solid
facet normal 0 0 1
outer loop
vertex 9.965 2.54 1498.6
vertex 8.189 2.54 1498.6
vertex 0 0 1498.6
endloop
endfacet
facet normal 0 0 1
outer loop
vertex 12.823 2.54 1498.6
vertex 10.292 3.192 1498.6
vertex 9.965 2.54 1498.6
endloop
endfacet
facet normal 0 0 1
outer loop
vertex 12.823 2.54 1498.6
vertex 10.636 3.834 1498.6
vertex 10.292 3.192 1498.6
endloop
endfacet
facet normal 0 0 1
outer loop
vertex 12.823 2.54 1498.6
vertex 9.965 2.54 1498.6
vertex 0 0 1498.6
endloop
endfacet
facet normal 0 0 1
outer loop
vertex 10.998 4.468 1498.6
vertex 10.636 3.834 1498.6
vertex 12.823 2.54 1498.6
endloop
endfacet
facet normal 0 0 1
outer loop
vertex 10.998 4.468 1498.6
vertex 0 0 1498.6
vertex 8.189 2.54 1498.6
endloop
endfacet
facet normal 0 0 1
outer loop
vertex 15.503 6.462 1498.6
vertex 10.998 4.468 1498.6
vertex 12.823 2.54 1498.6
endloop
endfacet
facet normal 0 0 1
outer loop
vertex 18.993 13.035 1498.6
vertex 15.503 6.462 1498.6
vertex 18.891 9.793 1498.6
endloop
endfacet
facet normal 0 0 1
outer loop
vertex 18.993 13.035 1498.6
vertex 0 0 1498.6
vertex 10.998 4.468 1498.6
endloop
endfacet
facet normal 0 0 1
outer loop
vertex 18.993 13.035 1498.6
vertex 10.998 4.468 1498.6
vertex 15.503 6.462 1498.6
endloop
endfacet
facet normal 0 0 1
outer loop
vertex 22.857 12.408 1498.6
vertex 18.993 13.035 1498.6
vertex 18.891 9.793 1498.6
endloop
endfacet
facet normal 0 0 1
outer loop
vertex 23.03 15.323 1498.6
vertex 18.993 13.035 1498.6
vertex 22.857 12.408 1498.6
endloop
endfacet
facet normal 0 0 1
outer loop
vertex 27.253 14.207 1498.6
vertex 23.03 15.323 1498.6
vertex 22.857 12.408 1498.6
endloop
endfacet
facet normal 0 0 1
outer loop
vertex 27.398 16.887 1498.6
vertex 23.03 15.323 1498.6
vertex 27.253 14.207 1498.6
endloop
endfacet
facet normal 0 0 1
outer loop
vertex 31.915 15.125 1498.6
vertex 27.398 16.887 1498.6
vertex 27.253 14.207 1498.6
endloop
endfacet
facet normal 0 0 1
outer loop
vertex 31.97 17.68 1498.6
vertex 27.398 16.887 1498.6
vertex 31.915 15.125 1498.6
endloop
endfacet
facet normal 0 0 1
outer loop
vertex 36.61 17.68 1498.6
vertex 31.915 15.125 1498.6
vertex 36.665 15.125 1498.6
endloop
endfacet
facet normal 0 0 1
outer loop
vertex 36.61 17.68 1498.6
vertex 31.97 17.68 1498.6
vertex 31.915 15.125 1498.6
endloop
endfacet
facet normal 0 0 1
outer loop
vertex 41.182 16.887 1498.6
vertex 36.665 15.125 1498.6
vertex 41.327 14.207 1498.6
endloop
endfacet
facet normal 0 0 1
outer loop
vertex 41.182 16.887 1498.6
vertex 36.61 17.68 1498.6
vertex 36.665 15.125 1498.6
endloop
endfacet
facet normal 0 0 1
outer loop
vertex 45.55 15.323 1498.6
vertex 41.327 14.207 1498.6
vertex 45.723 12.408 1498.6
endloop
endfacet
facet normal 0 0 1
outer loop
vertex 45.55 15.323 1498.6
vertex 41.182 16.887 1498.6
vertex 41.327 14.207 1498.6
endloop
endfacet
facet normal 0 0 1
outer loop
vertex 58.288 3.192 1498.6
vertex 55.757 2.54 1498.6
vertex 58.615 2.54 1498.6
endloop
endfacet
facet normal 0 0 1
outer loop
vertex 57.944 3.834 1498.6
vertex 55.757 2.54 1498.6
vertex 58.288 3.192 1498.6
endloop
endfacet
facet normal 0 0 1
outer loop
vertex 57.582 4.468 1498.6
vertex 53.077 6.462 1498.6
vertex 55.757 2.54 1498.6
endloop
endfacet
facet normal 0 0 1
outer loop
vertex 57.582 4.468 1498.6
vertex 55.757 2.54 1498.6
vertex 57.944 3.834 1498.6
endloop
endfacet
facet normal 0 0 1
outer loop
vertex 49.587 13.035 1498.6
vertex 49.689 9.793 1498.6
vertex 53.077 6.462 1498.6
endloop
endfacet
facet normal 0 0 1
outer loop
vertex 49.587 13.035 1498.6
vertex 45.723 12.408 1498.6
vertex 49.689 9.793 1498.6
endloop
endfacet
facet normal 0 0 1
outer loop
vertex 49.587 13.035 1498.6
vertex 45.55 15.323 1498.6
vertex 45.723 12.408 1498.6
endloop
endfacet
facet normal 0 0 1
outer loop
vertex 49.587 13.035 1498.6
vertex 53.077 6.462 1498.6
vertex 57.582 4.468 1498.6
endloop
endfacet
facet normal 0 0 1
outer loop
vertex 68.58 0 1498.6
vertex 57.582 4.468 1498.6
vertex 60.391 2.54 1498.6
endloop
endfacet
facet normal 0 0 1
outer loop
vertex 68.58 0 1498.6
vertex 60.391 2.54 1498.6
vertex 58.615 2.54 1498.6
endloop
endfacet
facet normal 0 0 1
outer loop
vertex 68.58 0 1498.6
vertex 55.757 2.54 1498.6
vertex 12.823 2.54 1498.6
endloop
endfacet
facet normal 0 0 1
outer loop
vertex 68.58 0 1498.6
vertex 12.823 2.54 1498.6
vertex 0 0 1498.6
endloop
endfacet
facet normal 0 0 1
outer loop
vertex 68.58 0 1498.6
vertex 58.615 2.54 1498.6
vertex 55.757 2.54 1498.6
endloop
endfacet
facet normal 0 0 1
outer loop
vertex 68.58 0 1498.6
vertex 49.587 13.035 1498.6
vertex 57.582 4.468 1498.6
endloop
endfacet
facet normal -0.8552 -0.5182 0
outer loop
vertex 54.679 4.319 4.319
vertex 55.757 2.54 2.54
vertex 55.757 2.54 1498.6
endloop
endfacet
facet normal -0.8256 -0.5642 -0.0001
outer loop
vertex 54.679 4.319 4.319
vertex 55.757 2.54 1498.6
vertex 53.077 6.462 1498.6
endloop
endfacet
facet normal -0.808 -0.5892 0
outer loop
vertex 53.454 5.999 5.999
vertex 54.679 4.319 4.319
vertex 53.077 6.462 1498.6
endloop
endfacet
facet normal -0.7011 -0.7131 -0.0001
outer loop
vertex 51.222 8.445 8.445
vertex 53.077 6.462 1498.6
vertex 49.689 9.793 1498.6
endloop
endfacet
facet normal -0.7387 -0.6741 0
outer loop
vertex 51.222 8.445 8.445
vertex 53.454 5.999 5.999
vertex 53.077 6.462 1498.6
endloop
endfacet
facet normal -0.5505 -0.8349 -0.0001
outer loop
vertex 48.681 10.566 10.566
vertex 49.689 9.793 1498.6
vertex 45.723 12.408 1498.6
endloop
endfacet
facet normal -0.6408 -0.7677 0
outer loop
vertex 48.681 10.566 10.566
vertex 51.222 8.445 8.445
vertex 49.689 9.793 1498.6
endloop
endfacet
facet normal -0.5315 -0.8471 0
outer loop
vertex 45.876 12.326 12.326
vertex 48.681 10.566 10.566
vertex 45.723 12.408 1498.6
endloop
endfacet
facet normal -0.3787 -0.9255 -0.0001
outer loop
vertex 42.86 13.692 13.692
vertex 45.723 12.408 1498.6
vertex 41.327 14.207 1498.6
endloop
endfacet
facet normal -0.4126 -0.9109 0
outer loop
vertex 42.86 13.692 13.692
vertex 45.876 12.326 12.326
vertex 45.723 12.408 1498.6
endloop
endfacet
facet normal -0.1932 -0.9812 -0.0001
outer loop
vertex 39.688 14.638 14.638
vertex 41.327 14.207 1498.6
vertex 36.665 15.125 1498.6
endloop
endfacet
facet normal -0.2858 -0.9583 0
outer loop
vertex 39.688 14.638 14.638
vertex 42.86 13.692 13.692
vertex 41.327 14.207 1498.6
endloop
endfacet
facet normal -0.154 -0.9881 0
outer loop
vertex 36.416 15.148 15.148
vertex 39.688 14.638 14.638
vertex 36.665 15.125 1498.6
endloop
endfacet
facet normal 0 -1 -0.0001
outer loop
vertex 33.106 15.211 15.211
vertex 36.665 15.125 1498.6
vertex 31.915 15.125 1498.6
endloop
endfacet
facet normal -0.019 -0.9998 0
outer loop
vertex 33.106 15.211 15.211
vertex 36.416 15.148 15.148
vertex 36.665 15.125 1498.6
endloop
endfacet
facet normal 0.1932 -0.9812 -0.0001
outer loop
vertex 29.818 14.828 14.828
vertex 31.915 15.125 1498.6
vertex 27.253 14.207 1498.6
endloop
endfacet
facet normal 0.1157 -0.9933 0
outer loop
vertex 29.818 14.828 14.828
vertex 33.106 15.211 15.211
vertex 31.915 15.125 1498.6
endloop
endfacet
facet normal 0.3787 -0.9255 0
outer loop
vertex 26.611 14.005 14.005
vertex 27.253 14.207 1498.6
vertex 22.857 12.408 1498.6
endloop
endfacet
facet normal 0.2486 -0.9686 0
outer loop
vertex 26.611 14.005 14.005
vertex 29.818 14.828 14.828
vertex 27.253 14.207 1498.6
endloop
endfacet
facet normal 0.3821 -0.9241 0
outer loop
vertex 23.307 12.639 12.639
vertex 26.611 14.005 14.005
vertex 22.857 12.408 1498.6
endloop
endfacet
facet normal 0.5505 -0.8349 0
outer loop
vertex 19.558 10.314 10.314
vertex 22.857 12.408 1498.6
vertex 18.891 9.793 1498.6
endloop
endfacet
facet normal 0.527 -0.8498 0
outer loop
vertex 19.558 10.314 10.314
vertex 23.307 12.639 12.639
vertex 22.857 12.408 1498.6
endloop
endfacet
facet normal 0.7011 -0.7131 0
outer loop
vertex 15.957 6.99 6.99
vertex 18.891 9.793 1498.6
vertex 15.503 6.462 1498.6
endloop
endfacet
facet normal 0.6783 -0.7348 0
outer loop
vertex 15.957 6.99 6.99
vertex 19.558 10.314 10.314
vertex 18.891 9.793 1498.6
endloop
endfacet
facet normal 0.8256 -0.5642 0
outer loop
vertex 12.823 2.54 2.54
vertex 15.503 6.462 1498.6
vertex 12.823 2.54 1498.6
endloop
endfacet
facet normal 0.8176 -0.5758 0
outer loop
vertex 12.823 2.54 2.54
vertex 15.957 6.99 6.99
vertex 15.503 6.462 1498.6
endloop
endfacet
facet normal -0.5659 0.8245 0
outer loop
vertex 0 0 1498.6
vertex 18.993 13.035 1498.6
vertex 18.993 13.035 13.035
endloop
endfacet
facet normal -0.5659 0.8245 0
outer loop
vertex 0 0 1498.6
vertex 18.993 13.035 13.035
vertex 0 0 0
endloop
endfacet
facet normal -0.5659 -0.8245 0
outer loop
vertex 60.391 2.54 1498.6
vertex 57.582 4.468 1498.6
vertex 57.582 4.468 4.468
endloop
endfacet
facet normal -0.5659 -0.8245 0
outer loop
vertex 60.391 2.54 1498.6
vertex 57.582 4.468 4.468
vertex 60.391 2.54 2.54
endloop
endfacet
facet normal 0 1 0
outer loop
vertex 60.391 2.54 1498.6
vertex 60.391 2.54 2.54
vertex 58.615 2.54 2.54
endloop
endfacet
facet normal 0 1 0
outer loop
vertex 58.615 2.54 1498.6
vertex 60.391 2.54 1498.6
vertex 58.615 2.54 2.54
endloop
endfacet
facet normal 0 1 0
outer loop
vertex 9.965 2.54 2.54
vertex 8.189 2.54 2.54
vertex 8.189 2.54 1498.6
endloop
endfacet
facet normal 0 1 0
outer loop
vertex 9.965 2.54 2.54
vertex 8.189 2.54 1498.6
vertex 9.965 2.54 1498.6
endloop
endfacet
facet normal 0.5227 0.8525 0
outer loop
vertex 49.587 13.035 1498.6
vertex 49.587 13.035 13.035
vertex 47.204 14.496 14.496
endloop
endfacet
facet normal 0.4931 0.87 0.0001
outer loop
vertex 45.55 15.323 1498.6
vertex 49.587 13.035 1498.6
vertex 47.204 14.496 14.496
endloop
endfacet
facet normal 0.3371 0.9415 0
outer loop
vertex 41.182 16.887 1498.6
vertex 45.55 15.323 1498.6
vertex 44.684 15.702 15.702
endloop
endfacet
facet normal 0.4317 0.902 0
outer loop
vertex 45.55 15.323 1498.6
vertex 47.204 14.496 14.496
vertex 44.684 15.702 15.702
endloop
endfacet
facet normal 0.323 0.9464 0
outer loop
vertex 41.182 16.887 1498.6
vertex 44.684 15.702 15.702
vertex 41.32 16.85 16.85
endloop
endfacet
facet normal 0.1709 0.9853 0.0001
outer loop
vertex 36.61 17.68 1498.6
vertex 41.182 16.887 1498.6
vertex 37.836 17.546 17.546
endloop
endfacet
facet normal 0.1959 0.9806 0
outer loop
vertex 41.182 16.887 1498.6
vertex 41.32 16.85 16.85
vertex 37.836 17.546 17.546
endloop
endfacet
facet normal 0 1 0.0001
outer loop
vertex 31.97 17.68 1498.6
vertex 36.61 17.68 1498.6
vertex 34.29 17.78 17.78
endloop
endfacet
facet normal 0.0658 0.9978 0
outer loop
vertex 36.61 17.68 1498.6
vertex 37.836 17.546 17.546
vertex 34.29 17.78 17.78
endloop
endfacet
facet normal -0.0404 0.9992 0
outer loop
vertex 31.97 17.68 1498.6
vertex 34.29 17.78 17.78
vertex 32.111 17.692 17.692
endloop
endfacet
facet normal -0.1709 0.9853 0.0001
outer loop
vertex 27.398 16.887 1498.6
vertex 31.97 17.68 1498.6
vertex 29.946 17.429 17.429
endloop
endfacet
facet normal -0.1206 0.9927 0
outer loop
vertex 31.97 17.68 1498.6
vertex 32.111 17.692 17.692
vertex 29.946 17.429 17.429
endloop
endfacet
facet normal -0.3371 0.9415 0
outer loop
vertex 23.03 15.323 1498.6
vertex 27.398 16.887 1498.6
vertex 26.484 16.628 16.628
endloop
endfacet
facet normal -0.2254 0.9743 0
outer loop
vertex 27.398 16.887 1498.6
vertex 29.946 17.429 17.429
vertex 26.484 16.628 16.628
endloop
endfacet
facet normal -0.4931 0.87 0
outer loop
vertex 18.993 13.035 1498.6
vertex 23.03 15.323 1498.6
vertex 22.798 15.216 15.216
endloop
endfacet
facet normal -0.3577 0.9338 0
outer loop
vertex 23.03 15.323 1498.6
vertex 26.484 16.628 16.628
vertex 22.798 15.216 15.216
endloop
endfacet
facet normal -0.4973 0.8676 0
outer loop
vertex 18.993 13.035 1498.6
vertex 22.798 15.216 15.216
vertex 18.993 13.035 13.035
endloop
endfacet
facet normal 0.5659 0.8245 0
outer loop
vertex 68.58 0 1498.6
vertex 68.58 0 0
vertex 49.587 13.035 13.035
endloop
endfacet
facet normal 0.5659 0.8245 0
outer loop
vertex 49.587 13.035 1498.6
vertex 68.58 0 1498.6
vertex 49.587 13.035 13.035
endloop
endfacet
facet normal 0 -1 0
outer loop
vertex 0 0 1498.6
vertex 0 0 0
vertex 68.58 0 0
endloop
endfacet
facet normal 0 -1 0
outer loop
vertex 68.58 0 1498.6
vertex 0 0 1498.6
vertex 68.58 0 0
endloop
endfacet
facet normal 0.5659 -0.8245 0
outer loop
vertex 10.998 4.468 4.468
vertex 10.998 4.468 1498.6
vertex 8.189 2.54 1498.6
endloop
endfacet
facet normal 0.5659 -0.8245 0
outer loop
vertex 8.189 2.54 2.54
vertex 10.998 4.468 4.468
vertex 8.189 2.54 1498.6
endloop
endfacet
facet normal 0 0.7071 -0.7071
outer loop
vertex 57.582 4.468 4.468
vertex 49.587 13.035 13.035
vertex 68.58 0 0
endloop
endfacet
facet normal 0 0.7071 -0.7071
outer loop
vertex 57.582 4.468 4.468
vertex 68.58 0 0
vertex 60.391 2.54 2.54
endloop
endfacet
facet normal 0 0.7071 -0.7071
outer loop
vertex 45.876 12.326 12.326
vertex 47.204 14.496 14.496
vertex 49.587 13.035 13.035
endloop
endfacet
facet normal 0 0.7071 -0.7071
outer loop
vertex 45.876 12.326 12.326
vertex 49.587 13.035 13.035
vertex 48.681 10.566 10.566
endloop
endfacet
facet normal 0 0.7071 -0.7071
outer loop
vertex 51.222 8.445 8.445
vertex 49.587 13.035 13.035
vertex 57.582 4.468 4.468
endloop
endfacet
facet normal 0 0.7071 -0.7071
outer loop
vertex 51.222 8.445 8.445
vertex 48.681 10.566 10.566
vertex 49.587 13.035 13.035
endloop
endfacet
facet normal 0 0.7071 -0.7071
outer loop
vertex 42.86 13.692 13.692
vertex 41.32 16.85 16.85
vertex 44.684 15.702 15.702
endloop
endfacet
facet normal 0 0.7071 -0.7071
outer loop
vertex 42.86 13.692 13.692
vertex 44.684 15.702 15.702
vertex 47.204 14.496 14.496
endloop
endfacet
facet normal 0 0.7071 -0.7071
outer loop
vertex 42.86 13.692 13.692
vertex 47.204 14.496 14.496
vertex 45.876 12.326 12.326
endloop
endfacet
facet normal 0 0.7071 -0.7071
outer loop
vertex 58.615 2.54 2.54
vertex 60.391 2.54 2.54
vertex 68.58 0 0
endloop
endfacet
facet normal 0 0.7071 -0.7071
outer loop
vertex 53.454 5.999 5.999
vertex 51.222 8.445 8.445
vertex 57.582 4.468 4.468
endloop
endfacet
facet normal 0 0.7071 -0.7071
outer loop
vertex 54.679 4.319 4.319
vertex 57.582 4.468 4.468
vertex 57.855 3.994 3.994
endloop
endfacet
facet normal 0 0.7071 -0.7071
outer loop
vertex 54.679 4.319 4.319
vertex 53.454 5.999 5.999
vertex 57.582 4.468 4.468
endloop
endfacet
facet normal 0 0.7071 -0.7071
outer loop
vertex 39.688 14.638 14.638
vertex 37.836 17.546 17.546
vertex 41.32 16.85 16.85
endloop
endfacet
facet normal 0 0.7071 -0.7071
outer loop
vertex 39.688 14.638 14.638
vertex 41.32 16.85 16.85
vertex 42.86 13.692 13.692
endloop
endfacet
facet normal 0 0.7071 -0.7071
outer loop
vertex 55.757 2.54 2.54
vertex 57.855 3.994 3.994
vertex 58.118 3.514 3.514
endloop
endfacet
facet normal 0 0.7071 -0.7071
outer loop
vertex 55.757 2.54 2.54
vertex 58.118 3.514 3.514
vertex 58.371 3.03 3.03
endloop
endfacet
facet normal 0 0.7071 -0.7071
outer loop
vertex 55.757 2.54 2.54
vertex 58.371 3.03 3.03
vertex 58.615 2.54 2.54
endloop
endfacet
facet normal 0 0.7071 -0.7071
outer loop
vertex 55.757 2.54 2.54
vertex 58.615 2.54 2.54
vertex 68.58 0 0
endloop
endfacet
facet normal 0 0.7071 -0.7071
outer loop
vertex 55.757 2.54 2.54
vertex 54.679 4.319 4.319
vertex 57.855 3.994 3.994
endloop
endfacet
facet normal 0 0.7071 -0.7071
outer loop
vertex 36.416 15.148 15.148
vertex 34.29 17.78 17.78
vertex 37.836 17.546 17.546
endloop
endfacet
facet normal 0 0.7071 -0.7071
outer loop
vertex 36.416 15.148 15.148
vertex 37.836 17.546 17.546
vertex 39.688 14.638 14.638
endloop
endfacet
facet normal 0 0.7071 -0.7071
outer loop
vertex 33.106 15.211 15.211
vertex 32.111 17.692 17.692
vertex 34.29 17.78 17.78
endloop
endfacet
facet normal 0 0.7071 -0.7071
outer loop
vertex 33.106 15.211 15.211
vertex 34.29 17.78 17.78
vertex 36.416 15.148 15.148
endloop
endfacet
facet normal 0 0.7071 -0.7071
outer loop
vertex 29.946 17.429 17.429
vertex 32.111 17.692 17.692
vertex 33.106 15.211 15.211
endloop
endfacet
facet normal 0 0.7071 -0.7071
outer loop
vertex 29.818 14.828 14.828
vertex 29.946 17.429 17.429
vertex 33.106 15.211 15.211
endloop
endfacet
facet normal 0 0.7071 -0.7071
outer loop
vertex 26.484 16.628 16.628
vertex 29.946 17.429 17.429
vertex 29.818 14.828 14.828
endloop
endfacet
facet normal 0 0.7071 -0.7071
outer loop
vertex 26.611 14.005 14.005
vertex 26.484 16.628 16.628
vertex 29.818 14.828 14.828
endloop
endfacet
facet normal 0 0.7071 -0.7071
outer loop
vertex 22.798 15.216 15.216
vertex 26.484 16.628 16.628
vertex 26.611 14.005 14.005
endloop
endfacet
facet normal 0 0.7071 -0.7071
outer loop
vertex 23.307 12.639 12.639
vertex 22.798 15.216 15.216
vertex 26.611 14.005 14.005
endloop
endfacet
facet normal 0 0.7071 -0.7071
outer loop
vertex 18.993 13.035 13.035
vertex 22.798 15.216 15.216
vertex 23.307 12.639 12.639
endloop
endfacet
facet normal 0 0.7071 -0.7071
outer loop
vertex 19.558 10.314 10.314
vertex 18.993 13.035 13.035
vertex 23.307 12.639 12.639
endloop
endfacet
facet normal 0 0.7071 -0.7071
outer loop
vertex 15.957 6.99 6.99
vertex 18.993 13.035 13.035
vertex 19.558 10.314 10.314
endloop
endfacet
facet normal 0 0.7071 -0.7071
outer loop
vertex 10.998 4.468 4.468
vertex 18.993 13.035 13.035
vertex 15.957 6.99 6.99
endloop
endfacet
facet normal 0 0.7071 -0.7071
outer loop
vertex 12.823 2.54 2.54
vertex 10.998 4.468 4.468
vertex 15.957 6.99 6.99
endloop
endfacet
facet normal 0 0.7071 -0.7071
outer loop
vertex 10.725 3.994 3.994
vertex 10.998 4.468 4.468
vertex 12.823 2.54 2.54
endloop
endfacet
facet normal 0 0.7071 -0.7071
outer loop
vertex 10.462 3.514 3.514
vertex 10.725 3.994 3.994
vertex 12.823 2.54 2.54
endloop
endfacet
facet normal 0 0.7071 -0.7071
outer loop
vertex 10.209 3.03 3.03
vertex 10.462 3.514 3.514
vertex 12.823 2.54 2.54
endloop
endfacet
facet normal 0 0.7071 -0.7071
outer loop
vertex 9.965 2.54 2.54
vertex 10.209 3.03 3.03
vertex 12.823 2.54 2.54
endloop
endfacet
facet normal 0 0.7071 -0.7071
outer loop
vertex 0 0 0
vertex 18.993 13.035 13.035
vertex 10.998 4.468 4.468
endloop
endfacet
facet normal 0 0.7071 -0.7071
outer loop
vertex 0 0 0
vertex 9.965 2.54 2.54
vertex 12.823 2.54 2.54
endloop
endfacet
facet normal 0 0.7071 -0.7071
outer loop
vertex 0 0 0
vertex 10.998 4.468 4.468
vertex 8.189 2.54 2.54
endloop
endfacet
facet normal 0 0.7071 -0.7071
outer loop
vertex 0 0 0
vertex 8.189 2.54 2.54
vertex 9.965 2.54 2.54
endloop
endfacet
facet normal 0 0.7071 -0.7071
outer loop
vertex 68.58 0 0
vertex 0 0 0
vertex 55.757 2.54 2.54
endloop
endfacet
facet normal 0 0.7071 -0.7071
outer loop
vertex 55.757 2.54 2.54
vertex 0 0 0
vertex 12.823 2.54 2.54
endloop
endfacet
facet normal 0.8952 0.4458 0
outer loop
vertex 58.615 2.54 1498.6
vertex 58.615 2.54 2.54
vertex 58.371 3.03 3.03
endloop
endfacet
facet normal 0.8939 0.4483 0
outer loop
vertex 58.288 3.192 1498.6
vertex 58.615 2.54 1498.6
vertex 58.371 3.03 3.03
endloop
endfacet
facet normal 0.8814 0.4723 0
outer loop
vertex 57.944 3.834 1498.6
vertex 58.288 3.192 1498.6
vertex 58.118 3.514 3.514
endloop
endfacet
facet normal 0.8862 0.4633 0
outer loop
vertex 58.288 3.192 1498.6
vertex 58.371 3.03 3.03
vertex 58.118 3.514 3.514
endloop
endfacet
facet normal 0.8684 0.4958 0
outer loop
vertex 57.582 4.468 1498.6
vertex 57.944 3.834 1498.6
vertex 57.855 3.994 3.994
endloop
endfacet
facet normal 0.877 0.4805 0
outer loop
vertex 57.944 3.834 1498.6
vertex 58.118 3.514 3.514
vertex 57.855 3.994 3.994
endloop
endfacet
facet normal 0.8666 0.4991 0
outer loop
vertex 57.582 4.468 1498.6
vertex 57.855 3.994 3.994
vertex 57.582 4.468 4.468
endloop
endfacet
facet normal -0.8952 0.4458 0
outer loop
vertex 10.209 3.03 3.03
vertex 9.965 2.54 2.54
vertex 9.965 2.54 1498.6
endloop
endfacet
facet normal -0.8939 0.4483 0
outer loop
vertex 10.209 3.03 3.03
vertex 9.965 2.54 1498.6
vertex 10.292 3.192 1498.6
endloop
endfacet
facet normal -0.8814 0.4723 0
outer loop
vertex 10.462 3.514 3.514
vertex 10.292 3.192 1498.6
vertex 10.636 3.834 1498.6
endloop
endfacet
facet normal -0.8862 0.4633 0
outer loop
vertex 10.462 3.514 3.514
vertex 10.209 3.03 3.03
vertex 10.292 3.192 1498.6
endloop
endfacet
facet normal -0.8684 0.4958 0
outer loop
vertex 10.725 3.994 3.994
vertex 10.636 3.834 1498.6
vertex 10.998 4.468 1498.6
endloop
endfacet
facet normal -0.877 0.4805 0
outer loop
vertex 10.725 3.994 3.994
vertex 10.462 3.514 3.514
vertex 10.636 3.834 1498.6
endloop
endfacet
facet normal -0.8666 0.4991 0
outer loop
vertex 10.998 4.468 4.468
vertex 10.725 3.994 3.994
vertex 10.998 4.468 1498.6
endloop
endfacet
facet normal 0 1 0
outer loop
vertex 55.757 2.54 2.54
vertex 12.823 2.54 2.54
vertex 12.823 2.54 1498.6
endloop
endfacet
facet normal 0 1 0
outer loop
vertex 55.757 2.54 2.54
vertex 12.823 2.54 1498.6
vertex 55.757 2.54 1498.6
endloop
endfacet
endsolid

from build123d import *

# Parameters (mm, degrees)
BOSS_EXTRUDE1_DEPTH = 1498.6
CUT_EXTRUDE1_DEPTH  = 69.58


with BuildPart() as part:
    # Sketch2 → Boss-Extrude1 (new body)
    with BuildSketch(Plane.XY):
        with BuildLine():
            Line((0, 0), (68.58, 0))
            Line((68.58, 0), (49.587320143, 13.03542143))
            ThreePointArc((49.587320143, 13.03542143), (34.29, 17.78), (18.992679857, 13.03542143))
            Line((18.992679857, 13.03542143), (0, 0))
        make_face()
        with BuildLine():
            Line((10.997802271, 4.46752515), (8.189387654, 2.54))
            Line((8.189387654, 2.54), (9.965035751, 2.54))
            ThreePointArc((9.965035751, 2.54), (10.461920618, 3.514209799), (10.997802271, 4.46752515))
        make_face(mode=Mode.SUBTRACT)
        with BuildLine():
            Line((57.582197729, 4.46752515), (60.390612346, 2.54))
            Line((60.390612346, 2.54), (58.614964249, 2.54))
            ThreePointArc((58.614964249, 2.54), (58.118079382, 3.514209799), (57.582197729, 4.46752515))
        make_face(mode=Mode.SUBTRACT)
        with BuildLine():
            Line((12.82308193, 2.54), (55.75691807, 2.54))
            ThreePointArc((55.75691807, 2.54), (34.29, 15.24), (12.82308193, 2.54))
        make_face(mode=Mode.SUBTRACT)
    extrude(amount=BOSS_EXTRUDE1_DEPTH)

    # Sketch3 → Cut-Extrude1 (cut, through all)
    with BuildSketch(Plane(origin=(0, 0, 0), x_dir=(0, 0, -1), z_dir=(1, 0, 0))):
        Polygon((-17.78, 17.78), (0, 0), (0, 17.78), align=None)
    extrude(amount=CUT_EXTRUDE1_DEPTH, mode=Mode.SUBTRACT)


solid = part.part
